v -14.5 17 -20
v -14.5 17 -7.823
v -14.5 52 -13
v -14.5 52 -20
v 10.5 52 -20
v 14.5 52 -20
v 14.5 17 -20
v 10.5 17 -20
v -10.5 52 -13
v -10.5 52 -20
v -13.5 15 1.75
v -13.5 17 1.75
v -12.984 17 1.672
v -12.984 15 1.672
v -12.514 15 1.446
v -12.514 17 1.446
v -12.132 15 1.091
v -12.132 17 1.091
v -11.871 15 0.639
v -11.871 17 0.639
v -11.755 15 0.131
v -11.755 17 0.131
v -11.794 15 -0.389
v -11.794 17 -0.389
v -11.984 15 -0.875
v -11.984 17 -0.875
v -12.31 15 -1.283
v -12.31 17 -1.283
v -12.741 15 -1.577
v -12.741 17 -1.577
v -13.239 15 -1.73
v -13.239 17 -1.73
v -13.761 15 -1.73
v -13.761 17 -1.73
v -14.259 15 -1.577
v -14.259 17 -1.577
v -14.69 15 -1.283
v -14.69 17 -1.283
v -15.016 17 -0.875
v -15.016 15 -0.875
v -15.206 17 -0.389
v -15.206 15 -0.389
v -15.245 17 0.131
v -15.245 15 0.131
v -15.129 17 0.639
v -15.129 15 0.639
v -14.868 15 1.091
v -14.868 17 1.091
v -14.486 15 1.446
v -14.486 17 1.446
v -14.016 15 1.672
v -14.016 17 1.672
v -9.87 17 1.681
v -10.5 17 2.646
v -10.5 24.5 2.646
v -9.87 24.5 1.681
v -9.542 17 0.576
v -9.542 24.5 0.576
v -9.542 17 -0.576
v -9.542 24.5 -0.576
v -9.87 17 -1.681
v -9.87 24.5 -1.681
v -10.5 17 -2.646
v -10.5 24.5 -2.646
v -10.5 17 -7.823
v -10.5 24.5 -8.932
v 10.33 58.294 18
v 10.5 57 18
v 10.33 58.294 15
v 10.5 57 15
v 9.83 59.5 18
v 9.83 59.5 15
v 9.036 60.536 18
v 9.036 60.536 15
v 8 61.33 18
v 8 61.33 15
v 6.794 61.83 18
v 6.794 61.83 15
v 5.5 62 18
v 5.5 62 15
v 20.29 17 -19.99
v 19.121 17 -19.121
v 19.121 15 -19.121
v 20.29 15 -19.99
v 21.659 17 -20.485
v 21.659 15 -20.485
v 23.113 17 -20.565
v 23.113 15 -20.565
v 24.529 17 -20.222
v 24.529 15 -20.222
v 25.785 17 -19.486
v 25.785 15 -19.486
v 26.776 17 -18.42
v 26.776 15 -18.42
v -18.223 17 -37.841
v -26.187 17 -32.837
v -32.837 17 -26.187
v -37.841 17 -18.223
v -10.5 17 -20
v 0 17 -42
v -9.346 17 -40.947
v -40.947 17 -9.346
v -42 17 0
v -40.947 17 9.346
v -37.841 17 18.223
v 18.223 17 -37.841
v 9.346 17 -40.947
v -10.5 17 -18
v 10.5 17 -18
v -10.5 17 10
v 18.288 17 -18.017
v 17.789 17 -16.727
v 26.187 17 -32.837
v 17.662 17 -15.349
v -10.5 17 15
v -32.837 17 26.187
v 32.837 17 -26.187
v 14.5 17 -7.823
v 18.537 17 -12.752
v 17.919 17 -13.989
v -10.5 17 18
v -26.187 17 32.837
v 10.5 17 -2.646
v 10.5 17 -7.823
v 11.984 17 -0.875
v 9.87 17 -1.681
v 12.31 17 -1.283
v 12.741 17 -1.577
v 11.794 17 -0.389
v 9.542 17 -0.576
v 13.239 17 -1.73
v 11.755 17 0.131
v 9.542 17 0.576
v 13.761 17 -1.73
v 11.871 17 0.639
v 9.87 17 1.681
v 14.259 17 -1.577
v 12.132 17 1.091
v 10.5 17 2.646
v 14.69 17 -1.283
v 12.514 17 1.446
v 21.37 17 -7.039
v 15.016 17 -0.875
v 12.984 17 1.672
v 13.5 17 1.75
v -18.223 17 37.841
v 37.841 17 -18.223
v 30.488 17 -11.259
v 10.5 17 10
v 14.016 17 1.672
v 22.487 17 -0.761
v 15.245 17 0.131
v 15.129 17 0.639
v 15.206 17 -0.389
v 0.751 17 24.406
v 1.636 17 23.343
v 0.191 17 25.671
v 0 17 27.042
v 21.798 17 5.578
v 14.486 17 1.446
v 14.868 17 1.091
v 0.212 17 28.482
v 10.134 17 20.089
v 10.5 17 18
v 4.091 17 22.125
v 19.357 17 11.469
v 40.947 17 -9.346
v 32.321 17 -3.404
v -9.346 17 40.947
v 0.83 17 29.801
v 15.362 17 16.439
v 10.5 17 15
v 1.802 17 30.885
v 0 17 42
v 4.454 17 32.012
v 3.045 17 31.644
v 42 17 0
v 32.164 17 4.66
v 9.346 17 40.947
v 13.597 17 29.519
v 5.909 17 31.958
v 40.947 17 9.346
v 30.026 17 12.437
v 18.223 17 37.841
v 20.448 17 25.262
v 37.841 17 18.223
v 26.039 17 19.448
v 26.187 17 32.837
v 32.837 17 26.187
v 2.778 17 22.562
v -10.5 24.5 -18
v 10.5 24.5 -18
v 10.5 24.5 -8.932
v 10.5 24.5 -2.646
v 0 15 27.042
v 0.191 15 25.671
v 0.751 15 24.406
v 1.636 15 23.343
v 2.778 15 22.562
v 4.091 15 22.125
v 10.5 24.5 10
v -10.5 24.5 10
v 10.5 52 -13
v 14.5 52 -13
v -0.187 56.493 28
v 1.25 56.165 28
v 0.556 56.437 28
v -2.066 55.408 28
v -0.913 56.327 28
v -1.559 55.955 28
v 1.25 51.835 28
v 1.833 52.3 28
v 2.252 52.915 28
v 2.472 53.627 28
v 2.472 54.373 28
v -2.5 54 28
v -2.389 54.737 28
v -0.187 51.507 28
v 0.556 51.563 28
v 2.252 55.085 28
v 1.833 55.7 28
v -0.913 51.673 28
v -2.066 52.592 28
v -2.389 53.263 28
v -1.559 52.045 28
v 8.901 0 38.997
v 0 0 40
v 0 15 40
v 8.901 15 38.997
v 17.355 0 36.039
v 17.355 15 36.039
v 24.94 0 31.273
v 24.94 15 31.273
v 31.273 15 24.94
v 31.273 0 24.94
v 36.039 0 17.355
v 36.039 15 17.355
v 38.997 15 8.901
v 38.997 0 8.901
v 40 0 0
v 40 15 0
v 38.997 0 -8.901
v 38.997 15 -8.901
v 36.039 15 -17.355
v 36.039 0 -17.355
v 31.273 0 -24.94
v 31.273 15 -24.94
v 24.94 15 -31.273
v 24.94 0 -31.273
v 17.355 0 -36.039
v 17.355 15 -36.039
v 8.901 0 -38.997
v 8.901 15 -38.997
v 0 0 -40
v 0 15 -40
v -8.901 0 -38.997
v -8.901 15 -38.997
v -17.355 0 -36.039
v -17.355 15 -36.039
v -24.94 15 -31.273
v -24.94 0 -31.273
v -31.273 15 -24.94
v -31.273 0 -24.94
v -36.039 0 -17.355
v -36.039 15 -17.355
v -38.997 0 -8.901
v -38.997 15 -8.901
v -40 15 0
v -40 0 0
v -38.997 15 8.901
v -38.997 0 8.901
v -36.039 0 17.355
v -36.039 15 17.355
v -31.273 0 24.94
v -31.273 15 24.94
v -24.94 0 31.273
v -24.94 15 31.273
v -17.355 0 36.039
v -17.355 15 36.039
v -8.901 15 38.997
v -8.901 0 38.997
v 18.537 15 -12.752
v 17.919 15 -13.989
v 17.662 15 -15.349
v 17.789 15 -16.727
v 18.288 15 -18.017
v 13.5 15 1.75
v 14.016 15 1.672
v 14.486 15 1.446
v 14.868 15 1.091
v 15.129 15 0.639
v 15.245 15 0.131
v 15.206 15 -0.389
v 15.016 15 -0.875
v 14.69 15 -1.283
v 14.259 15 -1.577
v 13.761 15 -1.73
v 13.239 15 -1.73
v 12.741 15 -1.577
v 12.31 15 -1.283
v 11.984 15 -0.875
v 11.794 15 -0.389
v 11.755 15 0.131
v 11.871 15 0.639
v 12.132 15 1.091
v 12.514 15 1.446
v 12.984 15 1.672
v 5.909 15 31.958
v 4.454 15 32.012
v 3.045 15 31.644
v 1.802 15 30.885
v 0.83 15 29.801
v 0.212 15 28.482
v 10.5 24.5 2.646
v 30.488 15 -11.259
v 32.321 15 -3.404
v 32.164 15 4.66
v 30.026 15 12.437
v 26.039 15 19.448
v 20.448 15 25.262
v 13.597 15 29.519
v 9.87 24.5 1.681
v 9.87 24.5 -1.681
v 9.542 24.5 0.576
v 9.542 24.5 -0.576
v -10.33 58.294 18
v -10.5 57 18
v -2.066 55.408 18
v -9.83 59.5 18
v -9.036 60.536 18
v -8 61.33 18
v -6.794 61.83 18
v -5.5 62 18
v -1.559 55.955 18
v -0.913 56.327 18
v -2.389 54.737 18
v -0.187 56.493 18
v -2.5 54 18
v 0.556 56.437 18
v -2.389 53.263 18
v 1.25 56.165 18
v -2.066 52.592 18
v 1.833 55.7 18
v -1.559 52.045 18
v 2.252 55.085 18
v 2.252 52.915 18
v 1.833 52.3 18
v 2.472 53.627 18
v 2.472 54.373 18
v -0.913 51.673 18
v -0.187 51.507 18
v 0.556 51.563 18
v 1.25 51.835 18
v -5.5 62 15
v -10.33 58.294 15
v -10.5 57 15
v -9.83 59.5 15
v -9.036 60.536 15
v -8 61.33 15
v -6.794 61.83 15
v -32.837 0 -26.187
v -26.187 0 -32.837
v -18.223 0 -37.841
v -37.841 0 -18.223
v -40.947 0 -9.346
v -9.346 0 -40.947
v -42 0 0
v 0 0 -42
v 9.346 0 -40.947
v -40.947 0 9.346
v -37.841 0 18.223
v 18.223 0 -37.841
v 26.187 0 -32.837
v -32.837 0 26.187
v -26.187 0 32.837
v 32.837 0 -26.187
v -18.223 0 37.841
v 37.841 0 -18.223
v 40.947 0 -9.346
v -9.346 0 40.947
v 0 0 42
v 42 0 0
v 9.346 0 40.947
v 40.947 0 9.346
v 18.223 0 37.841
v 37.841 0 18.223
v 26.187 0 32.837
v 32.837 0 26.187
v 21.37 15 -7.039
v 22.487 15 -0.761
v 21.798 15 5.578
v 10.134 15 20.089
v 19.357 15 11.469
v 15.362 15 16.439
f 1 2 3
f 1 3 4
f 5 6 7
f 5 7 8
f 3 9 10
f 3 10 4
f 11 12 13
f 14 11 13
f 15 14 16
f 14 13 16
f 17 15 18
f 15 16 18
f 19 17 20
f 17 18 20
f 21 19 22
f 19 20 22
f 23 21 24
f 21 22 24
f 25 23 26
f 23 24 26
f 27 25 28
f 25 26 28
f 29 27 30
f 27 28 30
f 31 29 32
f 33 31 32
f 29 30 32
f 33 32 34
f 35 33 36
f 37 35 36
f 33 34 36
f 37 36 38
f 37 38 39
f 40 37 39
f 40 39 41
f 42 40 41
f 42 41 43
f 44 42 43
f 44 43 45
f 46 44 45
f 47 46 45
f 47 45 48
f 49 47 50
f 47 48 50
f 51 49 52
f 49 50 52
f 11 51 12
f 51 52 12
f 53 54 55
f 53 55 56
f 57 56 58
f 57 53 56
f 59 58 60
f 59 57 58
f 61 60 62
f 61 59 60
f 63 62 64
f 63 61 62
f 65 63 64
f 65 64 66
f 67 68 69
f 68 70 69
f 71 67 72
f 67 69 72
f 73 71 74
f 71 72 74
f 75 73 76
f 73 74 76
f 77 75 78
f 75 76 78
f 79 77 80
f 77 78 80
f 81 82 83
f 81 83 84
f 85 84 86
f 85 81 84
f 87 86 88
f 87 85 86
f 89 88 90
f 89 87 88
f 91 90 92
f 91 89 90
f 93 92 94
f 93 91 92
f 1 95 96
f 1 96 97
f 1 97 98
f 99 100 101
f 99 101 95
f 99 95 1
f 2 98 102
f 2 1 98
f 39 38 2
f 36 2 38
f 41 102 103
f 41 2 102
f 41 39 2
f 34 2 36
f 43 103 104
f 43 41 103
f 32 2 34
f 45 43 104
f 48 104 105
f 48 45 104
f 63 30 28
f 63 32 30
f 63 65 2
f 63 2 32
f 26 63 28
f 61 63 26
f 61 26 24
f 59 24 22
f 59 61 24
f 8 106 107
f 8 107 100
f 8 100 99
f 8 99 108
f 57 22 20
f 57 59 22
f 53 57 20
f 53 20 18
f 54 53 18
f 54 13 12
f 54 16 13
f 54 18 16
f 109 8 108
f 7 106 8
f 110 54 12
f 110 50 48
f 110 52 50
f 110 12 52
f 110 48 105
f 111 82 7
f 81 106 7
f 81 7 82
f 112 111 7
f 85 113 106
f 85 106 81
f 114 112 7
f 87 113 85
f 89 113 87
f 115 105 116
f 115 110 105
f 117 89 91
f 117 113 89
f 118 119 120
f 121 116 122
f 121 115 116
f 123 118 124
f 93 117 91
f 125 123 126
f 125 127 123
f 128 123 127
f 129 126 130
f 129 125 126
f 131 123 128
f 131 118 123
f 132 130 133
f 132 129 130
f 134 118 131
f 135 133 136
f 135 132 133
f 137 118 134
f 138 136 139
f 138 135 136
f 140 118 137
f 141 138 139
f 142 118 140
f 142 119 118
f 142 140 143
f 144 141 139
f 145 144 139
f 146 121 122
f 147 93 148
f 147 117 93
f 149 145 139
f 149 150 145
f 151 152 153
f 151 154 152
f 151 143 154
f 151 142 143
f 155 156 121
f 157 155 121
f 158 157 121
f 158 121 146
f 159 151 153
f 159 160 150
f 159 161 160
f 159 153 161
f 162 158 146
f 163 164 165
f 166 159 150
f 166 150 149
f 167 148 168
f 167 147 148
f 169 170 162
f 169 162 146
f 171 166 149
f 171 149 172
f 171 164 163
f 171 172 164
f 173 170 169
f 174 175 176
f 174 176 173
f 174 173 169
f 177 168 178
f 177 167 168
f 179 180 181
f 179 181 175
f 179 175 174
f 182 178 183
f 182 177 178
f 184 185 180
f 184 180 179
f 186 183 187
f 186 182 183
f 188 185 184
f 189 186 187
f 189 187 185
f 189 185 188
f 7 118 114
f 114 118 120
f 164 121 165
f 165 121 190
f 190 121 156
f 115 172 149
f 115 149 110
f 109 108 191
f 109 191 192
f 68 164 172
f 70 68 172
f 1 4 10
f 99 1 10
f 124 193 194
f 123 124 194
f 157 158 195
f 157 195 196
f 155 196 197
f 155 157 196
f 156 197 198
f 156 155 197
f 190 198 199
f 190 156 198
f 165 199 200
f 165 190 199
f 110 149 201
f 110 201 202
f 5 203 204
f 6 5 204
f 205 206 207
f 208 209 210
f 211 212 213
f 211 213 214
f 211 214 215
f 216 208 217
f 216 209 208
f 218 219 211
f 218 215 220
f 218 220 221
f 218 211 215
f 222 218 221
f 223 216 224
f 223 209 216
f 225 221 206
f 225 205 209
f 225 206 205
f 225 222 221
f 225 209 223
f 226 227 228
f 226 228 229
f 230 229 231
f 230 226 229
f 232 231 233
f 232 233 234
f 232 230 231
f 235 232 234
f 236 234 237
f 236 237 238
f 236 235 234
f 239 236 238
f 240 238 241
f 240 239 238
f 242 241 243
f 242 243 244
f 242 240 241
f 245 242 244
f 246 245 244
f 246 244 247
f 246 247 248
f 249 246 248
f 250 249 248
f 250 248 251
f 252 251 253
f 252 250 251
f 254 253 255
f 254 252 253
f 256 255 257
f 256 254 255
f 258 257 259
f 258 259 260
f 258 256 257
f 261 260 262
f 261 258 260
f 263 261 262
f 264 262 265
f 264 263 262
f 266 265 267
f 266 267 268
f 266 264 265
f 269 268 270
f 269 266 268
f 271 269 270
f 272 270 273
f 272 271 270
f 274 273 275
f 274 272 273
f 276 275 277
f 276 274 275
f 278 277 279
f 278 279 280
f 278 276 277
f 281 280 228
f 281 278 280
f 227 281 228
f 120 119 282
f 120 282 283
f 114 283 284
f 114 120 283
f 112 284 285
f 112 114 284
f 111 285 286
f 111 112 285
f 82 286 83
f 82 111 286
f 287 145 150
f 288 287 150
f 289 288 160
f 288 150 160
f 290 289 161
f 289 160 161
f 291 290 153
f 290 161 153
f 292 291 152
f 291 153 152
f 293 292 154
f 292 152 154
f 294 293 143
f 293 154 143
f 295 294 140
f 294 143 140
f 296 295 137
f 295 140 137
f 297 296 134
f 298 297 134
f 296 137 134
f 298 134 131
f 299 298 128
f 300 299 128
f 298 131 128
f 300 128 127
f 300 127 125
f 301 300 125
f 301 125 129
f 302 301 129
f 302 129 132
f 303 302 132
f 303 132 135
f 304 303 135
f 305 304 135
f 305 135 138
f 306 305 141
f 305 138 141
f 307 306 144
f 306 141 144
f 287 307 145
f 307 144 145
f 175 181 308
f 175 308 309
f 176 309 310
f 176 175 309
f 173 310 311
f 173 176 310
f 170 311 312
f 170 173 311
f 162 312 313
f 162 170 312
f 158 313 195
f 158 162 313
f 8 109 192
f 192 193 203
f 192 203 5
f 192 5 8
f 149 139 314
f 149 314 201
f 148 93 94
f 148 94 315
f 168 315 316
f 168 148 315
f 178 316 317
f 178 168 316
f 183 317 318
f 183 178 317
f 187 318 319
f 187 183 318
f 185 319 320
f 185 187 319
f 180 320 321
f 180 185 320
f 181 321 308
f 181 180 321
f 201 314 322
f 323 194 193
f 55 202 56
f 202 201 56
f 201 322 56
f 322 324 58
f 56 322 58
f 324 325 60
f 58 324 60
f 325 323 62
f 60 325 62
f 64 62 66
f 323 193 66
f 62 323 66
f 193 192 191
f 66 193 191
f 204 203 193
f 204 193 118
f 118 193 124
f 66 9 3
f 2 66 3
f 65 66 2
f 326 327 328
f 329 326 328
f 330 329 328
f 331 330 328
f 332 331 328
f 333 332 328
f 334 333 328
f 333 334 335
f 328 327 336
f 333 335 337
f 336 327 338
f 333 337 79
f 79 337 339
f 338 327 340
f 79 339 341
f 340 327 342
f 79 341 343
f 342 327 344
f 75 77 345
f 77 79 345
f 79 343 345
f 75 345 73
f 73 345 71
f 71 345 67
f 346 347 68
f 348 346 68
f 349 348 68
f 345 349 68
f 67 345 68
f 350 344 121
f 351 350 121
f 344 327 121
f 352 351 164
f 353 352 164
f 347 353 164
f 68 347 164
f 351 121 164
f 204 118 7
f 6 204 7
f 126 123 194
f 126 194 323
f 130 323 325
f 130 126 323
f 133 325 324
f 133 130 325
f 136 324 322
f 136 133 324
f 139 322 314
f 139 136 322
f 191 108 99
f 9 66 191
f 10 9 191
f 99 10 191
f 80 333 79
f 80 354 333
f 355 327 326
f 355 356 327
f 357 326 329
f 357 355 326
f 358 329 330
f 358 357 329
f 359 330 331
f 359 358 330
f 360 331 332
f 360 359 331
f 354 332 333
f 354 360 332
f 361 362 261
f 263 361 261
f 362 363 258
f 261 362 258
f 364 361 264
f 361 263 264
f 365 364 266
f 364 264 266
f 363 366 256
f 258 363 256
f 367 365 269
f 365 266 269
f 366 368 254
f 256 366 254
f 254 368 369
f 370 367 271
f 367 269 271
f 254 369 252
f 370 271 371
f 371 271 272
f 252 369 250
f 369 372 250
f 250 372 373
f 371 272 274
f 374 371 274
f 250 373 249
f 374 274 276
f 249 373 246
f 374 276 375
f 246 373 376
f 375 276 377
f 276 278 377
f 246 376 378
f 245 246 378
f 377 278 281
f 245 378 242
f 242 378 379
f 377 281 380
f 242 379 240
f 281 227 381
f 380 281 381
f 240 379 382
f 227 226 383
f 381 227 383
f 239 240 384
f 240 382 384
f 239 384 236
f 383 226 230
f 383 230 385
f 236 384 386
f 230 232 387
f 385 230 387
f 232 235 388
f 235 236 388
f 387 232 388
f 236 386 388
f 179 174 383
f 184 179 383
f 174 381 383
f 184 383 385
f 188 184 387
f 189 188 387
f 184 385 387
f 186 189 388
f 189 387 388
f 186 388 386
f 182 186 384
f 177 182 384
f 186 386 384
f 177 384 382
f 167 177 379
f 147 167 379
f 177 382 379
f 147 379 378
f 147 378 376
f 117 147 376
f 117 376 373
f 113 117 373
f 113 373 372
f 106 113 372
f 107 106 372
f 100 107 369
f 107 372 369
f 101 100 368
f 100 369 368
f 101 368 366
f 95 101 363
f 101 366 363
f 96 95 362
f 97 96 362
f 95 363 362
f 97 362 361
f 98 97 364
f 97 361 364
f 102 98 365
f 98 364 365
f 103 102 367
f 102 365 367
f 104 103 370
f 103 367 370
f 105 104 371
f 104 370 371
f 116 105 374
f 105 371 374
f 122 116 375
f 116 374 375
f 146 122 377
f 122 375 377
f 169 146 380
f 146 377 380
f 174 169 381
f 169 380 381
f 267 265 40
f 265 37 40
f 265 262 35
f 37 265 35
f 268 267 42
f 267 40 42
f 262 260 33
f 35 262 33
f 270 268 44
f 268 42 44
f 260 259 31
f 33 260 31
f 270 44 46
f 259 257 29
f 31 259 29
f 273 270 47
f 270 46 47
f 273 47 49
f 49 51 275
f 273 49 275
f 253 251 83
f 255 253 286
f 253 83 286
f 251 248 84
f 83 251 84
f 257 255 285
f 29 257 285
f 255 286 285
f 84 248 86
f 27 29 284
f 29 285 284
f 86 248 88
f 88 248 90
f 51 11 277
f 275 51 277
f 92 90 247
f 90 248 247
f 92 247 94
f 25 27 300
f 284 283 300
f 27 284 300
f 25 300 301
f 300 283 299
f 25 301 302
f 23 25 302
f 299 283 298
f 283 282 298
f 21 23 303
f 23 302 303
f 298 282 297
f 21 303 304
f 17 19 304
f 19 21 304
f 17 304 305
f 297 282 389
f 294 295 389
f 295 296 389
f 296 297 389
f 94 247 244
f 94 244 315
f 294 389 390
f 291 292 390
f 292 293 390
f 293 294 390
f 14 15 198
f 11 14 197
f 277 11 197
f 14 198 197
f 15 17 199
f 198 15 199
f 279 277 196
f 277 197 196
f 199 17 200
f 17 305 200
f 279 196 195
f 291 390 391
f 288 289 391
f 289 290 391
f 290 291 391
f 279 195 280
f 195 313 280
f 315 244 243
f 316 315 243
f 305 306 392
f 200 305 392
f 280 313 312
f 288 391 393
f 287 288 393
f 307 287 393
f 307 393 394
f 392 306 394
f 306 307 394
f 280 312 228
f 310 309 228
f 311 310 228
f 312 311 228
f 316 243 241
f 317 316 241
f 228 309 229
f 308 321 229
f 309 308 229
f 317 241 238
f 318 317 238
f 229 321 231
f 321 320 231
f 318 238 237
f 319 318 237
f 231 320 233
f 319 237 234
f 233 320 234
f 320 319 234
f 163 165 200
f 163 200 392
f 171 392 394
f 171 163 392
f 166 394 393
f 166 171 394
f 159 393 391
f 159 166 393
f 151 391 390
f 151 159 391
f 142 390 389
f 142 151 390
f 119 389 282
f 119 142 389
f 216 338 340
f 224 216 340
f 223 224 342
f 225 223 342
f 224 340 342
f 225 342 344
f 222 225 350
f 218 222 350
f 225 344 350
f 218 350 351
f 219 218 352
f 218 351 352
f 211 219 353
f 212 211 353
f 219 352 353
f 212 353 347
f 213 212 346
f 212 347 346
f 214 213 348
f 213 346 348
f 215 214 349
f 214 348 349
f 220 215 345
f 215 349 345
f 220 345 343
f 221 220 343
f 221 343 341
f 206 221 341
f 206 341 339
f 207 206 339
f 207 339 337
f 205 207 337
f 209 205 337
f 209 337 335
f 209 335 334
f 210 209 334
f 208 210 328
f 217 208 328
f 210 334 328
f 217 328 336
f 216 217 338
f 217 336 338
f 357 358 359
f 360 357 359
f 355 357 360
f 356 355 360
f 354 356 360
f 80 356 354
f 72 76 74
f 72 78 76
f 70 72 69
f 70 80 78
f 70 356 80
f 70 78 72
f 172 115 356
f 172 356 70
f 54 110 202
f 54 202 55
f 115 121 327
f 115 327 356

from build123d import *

# Parameters (mm, degrees)
IZIM1_R                     = 42
IZIM1_R_2                   = 40
Y_KSEKLIK_EKSTR_ZYON1_DEPTH = 15
IZIM2_R                     = 42
Y_KSEKLIK_EKSTR_ZYON2_DEPTH = 2
IZIM3_R                     = 1.75
KES_EKSTR_ZYON1_DEPTH       = 2
KES_EKSTR_ZYON2_DEPTH       = 2
Y_KSEKLIK_EKSTR_ZYON3_DEPTH = 7.5
Y_KSEKLIK_EKSTR_ZYON4_DEPTH = 35
Y_KSEKLIK_EKSTR_ZYON5_DEPTH = 4
Y_KSEKLIK_EKSTR_ZYON6_DEPTH = 4
IZIM9_W                     = 21
IZIM9_H                     = 3
Y_KSEKLIK_EKSTR_ZYON7_DEPTH = 45
IZIM10_R                    = 2.5
Y_KSEKLIK_EKSTR_ZYON8_DEPTH = 10
RADYUS1_R                   = 5


with BuildPart() as part:
    # Çizim1 → Yükseklik-Ekstrüzyon1 (new body)
    with BuildSketch(Plane(origin=(0, 0, 0), x_dir=(1, 0, 0), z_dir=(0, 1, 0))):
        with Locations(Location((0, 0, 0), (0, 0, 270))):
            Circle(IZIM1_R)
        with Locations(Location((0, 0, 0), (0, 0, 270))):
            Circle(IZIM1_R_2, mode=Mode.SUBTRACT)
    extrude(amount=Y_KSEKLIK_EKSTR_ZYON1_DEPTH)

    # Çizim2 → Yükseklik-Ekstrüzyon2 (add)
    with BuildSketch(Plane(origin=(0, 15, 0), x_dir=(1, 0, 0), z_dir=(0, 1, 0))):
        with Locations(Location((0, 0, 0), (0, 0, 270))):
            Circle(IZIM2_R)
    extrude(amount=Y_KSEKLIK_EKSTR_ZYON2_DEPTH)

    # Çizim3 → Kes-Ekstrüzyon1 (cut)
    with BuildSketch(Plane(origin=(0, 17, 0), x_dir=(1, 0, 0), z_dir=(0, 1, 0))):
        with Locations(Location((-13.5, 0, 0), (0, 0, 270))):
            Circle(IZIM3_R)
        with Locations(Location((13.5, 0, 0), (0, 0, 270))):
            Circle(IZIM3_R)
    extrude(amount=-KES_EKSTR_ZYON1_DEPTH, mode=Mode.SUBTRACT)

    # Çizim4 → Kes-Ekstrüzyon2 (cut)
    with BuildSketch(Plane(origin=(0, 17, 0), x_dir=(1, 0, 0), z_dir=(0, 1, 0))):
        with BuildLine():
            ThreePointArc((19.121323176, 19.121323176), (23.11330853, 20.564910887), (26.776285642, 18.419569137))
            ThreePointArc((26.776285642, 18.419569137), (30.026084807, -12.437211552), (5.909090909, -31.958295396))
            ThreePointArc((5.909090909, -31.958295396), (1.801989255, -30.88516514), (0, -27.041634566))
            ThreePointArc((0, -27.041634566), (1.156469426, -23.843623821), (4.090909091, -22.124973736))
            ThreePointArc((4.090909091, -22.124973736), (20.787289482, -8.610377228), (18.537428522, 12.752009403))
            ThreePointArc((18.537428522, 12.752009403), (17.677735465, 16.042240718), (19.121323176, 19.121323176))
        make_face()
    extrude(amount=-KES_EKSTR_ZYON2_DEPTH, mode=Mode.SUBTRACT)

    # Çizim5 → Yükseklik-Ekstrüzyon3 (add)
    with BuildSketch(Plane(origin=(0, 17, 0), x_dir=(1, 0, 0), z_dir=(0, 1, 0))):
        with BuildLine():
            Line((-10.5, -10), (-10.5, -2.645751311))
            ThreePointArc((-10.5, -2.645751311), (-9.5, 0), (-10.5, 2.645751311))
            Line((-10.5, 2.645751311), (-10.5, 18))
            Line((-10.5, 18), (10.5, 18))
            Line((10.5, 18), (10.5, 2.645751311))
            ThreePointArc((10.5, 2.645751311), (9.5, 0), (10.5, -2.645751311))
            Line((10.5, -2.645751311), (10.5, -10))
            Line((10.5, -10), (-10.5, -10))
        make_face()
    extrude(amount=Y_KSEKLIK_EKSTR_ZYON3_DEPTH)

    # Çizim6 → Yükseklik-Ekstrüzyon4 (add)
    with BuildSketch(Plane(origin=(0, 17, 0), x_dir=(1, 0, 0), z_dir=(0, 1, 0))):
        Polygon((-10.5, 18), (-10.5, 13), (-14.5, 13), (-14.5, 20), (-10.5, 20), align=None)
        Polygon((10.5, 20), (10.5, 18), (10.5, 13), (14.5, 13), (14.5, 20), align=None)
    extrude(amount=Y_KSEKLIK_EKSTR_ZYON4_DEPTH)

    # Çizim7 → Yükseklik-Ekstrüzyon5 (add)
    with BuildSketch(Plane(origin=(10.5, 0, 0), x_dir=(0, 0, -1), z_dir=(1, 0, 0))):
        Polygon((13, 52), (7.822875656, 17), (13, 17), align=None)
    extrude(amount=Y_KSEKLIK_EKSTR_ZYON5_DEPTH)

    # Çizim8 → Yükseklik-Ekstrüzyon6 (add)
    with BuildSketch(Plane.ZY.offset(10.5)):
        Polygon((-13, 52), (-7.822875656, 17), (-13, 17), align=None)
    extrude(amount=Y_KSEKLIK_EKSTR_ZYON6_DEPTH)

    # Çizim9 → Yükseklik-Ekstrüzyon7 (add)
    with BuildSketch(Plane(origin=(0, 17, 0), x_dir=(1, 0, 0), z_dir=(0, 1, 0))):
        with Locations((0, -16.5)):
            Rectangle(IZIM9_W, IZIM9_H)
    extrude(amount=Y_KSEKLIK_EKSTR_ZYON7_DEPTH)

    # Çizim10 → Yükseklik-Ekstrüzyon8 (add)
    with BuildSketch(Plane.XY.offset(18)):
        with Locations(Location((0, 54, 0), (0, 0, 180))):
            Circle(IZIM10_R)
    extrude(amount=Y_KSEKLIK_EKSTR_ZYON8_DEPTH)

    # Radyus1
    radyus1_edges = [part.edges().sort_by_distance(p)[0] for p in [
        (-10.5, 62, 16.5),
        (10.5, 62, 16.5),
    ]]
    fillet(radyus1_edges, radius=RADYUS1_R)


solid = part.part
